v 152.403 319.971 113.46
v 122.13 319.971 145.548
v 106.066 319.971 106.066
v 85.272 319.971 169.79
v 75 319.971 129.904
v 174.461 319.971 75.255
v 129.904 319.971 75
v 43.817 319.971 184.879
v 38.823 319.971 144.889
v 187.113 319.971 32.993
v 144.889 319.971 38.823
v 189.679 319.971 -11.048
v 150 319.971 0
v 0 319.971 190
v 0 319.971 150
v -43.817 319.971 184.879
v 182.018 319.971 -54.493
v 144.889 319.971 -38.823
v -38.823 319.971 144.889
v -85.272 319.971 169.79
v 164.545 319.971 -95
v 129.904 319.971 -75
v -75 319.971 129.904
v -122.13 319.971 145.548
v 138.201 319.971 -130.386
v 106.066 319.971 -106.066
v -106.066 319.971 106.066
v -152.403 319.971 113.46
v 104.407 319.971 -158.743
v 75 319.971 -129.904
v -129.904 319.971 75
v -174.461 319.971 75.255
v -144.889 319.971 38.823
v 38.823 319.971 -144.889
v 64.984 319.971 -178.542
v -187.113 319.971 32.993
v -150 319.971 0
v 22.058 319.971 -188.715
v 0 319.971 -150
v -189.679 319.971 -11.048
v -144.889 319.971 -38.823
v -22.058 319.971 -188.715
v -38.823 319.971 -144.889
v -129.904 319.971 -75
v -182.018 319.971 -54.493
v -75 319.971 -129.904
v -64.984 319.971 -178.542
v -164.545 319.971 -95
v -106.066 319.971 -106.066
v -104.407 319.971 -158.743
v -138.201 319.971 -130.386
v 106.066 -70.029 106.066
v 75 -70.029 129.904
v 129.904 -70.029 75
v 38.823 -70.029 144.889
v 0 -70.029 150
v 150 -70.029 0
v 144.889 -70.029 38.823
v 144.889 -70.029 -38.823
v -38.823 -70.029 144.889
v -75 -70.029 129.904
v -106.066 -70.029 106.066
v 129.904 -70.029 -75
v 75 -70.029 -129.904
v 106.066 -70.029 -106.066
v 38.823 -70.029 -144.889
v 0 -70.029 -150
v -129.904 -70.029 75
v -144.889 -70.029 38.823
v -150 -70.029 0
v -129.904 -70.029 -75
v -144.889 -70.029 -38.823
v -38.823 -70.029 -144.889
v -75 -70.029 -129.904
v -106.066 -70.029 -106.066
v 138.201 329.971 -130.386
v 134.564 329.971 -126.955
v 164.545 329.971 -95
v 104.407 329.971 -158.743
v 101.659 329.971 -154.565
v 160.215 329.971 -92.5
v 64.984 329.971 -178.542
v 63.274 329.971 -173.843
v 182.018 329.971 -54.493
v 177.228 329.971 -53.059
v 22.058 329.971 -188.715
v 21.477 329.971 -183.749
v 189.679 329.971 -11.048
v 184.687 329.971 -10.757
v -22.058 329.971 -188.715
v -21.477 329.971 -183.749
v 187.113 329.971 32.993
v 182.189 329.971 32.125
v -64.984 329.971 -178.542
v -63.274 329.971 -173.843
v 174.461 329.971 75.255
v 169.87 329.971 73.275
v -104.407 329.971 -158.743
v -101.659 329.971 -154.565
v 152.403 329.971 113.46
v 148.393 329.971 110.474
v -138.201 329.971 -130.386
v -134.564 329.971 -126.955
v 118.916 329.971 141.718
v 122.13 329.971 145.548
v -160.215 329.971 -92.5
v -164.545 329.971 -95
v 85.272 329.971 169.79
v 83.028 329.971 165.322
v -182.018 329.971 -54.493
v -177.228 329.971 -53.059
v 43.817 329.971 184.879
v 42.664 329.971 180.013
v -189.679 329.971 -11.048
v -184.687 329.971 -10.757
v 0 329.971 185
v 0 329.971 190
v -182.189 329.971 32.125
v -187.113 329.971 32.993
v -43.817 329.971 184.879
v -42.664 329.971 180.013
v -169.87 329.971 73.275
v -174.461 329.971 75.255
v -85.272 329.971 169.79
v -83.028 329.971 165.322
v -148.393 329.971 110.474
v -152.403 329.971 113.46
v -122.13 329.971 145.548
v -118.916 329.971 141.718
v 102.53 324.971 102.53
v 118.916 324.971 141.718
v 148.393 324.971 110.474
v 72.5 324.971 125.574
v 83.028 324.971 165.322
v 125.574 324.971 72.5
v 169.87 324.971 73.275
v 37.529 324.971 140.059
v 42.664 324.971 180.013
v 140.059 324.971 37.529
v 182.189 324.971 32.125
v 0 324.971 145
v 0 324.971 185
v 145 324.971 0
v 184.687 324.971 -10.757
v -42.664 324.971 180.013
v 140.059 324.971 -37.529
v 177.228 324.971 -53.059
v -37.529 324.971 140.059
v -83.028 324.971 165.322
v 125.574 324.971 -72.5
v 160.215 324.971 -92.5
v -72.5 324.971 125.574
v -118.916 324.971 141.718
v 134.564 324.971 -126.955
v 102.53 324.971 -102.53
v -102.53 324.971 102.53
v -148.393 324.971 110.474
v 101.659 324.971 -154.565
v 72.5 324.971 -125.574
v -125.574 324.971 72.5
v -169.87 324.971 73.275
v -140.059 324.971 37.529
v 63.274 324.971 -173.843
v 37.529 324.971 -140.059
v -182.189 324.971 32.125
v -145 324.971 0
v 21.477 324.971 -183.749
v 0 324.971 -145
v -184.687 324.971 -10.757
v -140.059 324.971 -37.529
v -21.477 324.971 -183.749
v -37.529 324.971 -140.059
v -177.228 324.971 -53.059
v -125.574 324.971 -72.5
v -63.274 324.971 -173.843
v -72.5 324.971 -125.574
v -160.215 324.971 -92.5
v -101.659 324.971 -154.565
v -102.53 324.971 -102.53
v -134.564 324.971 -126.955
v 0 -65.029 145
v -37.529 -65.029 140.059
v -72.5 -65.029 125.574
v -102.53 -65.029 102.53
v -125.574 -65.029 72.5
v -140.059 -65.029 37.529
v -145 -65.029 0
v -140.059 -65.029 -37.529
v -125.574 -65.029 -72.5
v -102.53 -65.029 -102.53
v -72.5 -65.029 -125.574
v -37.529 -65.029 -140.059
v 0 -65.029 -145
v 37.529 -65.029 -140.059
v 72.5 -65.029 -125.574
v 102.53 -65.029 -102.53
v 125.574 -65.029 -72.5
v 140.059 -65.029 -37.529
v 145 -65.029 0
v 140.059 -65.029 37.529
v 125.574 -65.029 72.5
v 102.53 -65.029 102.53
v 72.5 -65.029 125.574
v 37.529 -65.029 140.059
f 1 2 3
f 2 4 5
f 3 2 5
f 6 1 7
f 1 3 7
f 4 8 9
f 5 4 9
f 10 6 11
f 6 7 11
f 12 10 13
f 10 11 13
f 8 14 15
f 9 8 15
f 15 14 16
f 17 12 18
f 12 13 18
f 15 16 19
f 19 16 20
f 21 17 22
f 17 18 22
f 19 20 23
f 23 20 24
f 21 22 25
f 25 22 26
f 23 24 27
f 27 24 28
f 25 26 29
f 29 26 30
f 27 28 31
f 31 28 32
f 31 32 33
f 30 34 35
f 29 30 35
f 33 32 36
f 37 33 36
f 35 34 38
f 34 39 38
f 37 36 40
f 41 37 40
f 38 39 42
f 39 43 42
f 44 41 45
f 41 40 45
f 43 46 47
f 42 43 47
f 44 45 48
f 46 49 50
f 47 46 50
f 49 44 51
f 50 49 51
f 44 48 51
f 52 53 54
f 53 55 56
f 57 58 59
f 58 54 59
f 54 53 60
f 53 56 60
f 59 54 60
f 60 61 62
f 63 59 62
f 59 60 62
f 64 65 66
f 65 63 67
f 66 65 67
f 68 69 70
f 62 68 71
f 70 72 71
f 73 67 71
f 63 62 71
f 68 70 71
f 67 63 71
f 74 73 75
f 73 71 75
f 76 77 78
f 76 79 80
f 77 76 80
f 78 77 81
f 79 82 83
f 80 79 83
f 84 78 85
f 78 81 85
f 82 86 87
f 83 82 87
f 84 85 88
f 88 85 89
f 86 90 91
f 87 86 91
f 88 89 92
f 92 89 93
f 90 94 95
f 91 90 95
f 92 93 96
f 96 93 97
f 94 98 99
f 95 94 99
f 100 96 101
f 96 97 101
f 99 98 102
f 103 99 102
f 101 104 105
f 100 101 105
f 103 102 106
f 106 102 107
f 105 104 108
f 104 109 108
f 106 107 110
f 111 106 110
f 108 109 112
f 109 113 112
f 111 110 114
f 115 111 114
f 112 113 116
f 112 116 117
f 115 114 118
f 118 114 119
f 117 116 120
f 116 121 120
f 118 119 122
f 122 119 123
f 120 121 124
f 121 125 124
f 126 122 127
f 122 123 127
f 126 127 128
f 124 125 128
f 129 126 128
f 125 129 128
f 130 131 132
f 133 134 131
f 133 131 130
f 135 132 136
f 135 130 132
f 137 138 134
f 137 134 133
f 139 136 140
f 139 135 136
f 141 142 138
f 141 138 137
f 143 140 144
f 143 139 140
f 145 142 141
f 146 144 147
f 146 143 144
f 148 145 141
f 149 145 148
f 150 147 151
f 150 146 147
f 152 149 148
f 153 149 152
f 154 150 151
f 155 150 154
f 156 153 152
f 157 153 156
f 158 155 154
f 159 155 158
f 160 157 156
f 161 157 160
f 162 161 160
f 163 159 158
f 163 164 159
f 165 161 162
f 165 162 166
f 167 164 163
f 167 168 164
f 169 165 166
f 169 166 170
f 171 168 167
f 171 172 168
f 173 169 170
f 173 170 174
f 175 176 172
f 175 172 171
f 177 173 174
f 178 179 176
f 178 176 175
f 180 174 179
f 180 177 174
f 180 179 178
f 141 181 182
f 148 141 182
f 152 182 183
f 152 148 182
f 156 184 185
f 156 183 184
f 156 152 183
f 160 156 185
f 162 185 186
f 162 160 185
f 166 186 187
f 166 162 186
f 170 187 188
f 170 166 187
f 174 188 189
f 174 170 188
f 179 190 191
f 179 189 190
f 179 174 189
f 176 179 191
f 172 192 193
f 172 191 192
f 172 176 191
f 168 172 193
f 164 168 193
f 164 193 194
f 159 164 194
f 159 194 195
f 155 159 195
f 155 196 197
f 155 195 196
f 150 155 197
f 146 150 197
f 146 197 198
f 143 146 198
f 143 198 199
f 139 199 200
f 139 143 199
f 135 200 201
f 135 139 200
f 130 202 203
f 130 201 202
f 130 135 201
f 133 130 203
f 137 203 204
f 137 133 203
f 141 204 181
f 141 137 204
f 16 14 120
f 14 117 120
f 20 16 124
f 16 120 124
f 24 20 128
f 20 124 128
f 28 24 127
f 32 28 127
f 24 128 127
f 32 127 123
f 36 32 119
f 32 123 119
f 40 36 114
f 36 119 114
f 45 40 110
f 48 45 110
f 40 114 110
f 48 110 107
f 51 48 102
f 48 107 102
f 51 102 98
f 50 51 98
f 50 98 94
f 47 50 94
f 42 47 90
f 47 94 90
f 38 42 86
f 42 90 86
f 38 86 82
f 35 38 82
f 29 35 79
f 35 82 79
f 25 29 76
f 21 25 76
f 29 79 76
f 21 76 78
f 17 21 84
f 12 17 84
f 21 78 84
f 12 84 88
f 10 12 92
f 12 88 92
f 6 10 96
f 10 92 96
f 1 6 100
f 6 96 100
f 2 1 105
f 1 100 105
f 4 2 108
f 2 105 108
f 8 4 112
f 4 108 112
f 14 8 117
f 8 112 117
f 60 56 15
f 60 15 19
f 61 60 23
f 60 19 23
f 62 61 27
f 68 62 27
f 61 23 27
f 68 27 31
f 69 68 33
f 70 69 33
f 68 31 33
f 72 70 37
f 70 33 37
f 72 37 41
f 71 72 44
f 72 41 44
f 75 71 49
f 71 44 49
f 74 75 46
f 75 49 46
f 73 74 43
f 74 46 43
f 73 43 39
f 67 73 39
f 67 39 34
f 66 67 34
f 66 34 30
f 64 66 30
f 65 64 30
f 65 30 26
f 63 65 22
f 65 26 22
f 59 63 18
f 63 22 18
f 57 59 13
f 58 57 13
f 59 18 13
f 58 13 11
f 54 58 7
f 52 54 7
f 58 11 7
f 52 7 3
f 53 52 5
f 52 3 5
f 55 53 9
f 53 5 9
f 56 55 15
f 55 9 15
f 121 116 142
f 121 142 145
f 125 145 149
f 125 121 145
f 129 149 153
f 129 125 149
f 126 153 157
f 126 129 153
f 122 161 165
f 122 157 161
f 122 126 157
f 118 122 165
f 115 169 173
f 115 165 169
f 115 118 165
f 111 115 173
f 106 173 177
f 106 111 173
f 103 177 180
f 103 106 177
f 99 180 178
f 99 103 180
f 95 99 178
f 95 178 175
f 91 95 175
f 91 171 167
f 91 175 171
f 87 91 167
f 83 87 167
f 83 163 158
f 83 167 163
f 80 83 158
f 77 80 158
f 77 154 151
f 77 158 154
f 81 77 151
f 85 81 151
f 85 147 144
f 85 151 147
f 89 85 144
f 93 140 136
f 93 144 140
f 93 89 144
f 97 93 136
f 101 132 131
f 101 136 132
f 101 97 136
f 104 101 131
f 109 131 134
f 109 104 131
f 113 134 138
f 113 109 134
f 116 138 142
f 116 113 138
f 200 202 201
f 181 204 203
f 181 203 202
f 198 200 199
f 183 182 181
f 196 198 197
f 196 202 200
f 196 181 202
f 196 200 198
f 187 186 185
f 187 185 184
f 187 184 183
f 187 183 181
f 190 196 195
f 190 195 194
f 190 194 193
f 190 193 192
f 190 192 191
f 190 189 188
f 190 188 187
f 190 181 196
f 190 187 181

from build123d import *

# Parameters (mm, degrees)
SHELL1_T = -5


with BuildPart() as part:
    # Sketch1 → Revolve1 (revolve)
    with BuildSketch(Plane(origin=(0, 0, 0), x_dir=(0, 0, -1), z_dir=(1, 0, 0))):
        Polygon((0, 329.971145898), (0, -70.028854102), (-150, -70.028854102), (-150, 319.971145898), (-190, 319.971145898), (-190, 329.971145898), align=None)
    revolve(axis=Axis((0, 438.369922809, 0), (0, -1, 0)))

    # Shell1
    shell1_openings = [part.faces().sort_by_distance(p)[0] for p in [
        (0, 329.971145898, 0),
    ]]
    offset(amount=SHELL1_T, openings=shell1_openings, kind=Kind.INTERSECTION)


solid = part.part
